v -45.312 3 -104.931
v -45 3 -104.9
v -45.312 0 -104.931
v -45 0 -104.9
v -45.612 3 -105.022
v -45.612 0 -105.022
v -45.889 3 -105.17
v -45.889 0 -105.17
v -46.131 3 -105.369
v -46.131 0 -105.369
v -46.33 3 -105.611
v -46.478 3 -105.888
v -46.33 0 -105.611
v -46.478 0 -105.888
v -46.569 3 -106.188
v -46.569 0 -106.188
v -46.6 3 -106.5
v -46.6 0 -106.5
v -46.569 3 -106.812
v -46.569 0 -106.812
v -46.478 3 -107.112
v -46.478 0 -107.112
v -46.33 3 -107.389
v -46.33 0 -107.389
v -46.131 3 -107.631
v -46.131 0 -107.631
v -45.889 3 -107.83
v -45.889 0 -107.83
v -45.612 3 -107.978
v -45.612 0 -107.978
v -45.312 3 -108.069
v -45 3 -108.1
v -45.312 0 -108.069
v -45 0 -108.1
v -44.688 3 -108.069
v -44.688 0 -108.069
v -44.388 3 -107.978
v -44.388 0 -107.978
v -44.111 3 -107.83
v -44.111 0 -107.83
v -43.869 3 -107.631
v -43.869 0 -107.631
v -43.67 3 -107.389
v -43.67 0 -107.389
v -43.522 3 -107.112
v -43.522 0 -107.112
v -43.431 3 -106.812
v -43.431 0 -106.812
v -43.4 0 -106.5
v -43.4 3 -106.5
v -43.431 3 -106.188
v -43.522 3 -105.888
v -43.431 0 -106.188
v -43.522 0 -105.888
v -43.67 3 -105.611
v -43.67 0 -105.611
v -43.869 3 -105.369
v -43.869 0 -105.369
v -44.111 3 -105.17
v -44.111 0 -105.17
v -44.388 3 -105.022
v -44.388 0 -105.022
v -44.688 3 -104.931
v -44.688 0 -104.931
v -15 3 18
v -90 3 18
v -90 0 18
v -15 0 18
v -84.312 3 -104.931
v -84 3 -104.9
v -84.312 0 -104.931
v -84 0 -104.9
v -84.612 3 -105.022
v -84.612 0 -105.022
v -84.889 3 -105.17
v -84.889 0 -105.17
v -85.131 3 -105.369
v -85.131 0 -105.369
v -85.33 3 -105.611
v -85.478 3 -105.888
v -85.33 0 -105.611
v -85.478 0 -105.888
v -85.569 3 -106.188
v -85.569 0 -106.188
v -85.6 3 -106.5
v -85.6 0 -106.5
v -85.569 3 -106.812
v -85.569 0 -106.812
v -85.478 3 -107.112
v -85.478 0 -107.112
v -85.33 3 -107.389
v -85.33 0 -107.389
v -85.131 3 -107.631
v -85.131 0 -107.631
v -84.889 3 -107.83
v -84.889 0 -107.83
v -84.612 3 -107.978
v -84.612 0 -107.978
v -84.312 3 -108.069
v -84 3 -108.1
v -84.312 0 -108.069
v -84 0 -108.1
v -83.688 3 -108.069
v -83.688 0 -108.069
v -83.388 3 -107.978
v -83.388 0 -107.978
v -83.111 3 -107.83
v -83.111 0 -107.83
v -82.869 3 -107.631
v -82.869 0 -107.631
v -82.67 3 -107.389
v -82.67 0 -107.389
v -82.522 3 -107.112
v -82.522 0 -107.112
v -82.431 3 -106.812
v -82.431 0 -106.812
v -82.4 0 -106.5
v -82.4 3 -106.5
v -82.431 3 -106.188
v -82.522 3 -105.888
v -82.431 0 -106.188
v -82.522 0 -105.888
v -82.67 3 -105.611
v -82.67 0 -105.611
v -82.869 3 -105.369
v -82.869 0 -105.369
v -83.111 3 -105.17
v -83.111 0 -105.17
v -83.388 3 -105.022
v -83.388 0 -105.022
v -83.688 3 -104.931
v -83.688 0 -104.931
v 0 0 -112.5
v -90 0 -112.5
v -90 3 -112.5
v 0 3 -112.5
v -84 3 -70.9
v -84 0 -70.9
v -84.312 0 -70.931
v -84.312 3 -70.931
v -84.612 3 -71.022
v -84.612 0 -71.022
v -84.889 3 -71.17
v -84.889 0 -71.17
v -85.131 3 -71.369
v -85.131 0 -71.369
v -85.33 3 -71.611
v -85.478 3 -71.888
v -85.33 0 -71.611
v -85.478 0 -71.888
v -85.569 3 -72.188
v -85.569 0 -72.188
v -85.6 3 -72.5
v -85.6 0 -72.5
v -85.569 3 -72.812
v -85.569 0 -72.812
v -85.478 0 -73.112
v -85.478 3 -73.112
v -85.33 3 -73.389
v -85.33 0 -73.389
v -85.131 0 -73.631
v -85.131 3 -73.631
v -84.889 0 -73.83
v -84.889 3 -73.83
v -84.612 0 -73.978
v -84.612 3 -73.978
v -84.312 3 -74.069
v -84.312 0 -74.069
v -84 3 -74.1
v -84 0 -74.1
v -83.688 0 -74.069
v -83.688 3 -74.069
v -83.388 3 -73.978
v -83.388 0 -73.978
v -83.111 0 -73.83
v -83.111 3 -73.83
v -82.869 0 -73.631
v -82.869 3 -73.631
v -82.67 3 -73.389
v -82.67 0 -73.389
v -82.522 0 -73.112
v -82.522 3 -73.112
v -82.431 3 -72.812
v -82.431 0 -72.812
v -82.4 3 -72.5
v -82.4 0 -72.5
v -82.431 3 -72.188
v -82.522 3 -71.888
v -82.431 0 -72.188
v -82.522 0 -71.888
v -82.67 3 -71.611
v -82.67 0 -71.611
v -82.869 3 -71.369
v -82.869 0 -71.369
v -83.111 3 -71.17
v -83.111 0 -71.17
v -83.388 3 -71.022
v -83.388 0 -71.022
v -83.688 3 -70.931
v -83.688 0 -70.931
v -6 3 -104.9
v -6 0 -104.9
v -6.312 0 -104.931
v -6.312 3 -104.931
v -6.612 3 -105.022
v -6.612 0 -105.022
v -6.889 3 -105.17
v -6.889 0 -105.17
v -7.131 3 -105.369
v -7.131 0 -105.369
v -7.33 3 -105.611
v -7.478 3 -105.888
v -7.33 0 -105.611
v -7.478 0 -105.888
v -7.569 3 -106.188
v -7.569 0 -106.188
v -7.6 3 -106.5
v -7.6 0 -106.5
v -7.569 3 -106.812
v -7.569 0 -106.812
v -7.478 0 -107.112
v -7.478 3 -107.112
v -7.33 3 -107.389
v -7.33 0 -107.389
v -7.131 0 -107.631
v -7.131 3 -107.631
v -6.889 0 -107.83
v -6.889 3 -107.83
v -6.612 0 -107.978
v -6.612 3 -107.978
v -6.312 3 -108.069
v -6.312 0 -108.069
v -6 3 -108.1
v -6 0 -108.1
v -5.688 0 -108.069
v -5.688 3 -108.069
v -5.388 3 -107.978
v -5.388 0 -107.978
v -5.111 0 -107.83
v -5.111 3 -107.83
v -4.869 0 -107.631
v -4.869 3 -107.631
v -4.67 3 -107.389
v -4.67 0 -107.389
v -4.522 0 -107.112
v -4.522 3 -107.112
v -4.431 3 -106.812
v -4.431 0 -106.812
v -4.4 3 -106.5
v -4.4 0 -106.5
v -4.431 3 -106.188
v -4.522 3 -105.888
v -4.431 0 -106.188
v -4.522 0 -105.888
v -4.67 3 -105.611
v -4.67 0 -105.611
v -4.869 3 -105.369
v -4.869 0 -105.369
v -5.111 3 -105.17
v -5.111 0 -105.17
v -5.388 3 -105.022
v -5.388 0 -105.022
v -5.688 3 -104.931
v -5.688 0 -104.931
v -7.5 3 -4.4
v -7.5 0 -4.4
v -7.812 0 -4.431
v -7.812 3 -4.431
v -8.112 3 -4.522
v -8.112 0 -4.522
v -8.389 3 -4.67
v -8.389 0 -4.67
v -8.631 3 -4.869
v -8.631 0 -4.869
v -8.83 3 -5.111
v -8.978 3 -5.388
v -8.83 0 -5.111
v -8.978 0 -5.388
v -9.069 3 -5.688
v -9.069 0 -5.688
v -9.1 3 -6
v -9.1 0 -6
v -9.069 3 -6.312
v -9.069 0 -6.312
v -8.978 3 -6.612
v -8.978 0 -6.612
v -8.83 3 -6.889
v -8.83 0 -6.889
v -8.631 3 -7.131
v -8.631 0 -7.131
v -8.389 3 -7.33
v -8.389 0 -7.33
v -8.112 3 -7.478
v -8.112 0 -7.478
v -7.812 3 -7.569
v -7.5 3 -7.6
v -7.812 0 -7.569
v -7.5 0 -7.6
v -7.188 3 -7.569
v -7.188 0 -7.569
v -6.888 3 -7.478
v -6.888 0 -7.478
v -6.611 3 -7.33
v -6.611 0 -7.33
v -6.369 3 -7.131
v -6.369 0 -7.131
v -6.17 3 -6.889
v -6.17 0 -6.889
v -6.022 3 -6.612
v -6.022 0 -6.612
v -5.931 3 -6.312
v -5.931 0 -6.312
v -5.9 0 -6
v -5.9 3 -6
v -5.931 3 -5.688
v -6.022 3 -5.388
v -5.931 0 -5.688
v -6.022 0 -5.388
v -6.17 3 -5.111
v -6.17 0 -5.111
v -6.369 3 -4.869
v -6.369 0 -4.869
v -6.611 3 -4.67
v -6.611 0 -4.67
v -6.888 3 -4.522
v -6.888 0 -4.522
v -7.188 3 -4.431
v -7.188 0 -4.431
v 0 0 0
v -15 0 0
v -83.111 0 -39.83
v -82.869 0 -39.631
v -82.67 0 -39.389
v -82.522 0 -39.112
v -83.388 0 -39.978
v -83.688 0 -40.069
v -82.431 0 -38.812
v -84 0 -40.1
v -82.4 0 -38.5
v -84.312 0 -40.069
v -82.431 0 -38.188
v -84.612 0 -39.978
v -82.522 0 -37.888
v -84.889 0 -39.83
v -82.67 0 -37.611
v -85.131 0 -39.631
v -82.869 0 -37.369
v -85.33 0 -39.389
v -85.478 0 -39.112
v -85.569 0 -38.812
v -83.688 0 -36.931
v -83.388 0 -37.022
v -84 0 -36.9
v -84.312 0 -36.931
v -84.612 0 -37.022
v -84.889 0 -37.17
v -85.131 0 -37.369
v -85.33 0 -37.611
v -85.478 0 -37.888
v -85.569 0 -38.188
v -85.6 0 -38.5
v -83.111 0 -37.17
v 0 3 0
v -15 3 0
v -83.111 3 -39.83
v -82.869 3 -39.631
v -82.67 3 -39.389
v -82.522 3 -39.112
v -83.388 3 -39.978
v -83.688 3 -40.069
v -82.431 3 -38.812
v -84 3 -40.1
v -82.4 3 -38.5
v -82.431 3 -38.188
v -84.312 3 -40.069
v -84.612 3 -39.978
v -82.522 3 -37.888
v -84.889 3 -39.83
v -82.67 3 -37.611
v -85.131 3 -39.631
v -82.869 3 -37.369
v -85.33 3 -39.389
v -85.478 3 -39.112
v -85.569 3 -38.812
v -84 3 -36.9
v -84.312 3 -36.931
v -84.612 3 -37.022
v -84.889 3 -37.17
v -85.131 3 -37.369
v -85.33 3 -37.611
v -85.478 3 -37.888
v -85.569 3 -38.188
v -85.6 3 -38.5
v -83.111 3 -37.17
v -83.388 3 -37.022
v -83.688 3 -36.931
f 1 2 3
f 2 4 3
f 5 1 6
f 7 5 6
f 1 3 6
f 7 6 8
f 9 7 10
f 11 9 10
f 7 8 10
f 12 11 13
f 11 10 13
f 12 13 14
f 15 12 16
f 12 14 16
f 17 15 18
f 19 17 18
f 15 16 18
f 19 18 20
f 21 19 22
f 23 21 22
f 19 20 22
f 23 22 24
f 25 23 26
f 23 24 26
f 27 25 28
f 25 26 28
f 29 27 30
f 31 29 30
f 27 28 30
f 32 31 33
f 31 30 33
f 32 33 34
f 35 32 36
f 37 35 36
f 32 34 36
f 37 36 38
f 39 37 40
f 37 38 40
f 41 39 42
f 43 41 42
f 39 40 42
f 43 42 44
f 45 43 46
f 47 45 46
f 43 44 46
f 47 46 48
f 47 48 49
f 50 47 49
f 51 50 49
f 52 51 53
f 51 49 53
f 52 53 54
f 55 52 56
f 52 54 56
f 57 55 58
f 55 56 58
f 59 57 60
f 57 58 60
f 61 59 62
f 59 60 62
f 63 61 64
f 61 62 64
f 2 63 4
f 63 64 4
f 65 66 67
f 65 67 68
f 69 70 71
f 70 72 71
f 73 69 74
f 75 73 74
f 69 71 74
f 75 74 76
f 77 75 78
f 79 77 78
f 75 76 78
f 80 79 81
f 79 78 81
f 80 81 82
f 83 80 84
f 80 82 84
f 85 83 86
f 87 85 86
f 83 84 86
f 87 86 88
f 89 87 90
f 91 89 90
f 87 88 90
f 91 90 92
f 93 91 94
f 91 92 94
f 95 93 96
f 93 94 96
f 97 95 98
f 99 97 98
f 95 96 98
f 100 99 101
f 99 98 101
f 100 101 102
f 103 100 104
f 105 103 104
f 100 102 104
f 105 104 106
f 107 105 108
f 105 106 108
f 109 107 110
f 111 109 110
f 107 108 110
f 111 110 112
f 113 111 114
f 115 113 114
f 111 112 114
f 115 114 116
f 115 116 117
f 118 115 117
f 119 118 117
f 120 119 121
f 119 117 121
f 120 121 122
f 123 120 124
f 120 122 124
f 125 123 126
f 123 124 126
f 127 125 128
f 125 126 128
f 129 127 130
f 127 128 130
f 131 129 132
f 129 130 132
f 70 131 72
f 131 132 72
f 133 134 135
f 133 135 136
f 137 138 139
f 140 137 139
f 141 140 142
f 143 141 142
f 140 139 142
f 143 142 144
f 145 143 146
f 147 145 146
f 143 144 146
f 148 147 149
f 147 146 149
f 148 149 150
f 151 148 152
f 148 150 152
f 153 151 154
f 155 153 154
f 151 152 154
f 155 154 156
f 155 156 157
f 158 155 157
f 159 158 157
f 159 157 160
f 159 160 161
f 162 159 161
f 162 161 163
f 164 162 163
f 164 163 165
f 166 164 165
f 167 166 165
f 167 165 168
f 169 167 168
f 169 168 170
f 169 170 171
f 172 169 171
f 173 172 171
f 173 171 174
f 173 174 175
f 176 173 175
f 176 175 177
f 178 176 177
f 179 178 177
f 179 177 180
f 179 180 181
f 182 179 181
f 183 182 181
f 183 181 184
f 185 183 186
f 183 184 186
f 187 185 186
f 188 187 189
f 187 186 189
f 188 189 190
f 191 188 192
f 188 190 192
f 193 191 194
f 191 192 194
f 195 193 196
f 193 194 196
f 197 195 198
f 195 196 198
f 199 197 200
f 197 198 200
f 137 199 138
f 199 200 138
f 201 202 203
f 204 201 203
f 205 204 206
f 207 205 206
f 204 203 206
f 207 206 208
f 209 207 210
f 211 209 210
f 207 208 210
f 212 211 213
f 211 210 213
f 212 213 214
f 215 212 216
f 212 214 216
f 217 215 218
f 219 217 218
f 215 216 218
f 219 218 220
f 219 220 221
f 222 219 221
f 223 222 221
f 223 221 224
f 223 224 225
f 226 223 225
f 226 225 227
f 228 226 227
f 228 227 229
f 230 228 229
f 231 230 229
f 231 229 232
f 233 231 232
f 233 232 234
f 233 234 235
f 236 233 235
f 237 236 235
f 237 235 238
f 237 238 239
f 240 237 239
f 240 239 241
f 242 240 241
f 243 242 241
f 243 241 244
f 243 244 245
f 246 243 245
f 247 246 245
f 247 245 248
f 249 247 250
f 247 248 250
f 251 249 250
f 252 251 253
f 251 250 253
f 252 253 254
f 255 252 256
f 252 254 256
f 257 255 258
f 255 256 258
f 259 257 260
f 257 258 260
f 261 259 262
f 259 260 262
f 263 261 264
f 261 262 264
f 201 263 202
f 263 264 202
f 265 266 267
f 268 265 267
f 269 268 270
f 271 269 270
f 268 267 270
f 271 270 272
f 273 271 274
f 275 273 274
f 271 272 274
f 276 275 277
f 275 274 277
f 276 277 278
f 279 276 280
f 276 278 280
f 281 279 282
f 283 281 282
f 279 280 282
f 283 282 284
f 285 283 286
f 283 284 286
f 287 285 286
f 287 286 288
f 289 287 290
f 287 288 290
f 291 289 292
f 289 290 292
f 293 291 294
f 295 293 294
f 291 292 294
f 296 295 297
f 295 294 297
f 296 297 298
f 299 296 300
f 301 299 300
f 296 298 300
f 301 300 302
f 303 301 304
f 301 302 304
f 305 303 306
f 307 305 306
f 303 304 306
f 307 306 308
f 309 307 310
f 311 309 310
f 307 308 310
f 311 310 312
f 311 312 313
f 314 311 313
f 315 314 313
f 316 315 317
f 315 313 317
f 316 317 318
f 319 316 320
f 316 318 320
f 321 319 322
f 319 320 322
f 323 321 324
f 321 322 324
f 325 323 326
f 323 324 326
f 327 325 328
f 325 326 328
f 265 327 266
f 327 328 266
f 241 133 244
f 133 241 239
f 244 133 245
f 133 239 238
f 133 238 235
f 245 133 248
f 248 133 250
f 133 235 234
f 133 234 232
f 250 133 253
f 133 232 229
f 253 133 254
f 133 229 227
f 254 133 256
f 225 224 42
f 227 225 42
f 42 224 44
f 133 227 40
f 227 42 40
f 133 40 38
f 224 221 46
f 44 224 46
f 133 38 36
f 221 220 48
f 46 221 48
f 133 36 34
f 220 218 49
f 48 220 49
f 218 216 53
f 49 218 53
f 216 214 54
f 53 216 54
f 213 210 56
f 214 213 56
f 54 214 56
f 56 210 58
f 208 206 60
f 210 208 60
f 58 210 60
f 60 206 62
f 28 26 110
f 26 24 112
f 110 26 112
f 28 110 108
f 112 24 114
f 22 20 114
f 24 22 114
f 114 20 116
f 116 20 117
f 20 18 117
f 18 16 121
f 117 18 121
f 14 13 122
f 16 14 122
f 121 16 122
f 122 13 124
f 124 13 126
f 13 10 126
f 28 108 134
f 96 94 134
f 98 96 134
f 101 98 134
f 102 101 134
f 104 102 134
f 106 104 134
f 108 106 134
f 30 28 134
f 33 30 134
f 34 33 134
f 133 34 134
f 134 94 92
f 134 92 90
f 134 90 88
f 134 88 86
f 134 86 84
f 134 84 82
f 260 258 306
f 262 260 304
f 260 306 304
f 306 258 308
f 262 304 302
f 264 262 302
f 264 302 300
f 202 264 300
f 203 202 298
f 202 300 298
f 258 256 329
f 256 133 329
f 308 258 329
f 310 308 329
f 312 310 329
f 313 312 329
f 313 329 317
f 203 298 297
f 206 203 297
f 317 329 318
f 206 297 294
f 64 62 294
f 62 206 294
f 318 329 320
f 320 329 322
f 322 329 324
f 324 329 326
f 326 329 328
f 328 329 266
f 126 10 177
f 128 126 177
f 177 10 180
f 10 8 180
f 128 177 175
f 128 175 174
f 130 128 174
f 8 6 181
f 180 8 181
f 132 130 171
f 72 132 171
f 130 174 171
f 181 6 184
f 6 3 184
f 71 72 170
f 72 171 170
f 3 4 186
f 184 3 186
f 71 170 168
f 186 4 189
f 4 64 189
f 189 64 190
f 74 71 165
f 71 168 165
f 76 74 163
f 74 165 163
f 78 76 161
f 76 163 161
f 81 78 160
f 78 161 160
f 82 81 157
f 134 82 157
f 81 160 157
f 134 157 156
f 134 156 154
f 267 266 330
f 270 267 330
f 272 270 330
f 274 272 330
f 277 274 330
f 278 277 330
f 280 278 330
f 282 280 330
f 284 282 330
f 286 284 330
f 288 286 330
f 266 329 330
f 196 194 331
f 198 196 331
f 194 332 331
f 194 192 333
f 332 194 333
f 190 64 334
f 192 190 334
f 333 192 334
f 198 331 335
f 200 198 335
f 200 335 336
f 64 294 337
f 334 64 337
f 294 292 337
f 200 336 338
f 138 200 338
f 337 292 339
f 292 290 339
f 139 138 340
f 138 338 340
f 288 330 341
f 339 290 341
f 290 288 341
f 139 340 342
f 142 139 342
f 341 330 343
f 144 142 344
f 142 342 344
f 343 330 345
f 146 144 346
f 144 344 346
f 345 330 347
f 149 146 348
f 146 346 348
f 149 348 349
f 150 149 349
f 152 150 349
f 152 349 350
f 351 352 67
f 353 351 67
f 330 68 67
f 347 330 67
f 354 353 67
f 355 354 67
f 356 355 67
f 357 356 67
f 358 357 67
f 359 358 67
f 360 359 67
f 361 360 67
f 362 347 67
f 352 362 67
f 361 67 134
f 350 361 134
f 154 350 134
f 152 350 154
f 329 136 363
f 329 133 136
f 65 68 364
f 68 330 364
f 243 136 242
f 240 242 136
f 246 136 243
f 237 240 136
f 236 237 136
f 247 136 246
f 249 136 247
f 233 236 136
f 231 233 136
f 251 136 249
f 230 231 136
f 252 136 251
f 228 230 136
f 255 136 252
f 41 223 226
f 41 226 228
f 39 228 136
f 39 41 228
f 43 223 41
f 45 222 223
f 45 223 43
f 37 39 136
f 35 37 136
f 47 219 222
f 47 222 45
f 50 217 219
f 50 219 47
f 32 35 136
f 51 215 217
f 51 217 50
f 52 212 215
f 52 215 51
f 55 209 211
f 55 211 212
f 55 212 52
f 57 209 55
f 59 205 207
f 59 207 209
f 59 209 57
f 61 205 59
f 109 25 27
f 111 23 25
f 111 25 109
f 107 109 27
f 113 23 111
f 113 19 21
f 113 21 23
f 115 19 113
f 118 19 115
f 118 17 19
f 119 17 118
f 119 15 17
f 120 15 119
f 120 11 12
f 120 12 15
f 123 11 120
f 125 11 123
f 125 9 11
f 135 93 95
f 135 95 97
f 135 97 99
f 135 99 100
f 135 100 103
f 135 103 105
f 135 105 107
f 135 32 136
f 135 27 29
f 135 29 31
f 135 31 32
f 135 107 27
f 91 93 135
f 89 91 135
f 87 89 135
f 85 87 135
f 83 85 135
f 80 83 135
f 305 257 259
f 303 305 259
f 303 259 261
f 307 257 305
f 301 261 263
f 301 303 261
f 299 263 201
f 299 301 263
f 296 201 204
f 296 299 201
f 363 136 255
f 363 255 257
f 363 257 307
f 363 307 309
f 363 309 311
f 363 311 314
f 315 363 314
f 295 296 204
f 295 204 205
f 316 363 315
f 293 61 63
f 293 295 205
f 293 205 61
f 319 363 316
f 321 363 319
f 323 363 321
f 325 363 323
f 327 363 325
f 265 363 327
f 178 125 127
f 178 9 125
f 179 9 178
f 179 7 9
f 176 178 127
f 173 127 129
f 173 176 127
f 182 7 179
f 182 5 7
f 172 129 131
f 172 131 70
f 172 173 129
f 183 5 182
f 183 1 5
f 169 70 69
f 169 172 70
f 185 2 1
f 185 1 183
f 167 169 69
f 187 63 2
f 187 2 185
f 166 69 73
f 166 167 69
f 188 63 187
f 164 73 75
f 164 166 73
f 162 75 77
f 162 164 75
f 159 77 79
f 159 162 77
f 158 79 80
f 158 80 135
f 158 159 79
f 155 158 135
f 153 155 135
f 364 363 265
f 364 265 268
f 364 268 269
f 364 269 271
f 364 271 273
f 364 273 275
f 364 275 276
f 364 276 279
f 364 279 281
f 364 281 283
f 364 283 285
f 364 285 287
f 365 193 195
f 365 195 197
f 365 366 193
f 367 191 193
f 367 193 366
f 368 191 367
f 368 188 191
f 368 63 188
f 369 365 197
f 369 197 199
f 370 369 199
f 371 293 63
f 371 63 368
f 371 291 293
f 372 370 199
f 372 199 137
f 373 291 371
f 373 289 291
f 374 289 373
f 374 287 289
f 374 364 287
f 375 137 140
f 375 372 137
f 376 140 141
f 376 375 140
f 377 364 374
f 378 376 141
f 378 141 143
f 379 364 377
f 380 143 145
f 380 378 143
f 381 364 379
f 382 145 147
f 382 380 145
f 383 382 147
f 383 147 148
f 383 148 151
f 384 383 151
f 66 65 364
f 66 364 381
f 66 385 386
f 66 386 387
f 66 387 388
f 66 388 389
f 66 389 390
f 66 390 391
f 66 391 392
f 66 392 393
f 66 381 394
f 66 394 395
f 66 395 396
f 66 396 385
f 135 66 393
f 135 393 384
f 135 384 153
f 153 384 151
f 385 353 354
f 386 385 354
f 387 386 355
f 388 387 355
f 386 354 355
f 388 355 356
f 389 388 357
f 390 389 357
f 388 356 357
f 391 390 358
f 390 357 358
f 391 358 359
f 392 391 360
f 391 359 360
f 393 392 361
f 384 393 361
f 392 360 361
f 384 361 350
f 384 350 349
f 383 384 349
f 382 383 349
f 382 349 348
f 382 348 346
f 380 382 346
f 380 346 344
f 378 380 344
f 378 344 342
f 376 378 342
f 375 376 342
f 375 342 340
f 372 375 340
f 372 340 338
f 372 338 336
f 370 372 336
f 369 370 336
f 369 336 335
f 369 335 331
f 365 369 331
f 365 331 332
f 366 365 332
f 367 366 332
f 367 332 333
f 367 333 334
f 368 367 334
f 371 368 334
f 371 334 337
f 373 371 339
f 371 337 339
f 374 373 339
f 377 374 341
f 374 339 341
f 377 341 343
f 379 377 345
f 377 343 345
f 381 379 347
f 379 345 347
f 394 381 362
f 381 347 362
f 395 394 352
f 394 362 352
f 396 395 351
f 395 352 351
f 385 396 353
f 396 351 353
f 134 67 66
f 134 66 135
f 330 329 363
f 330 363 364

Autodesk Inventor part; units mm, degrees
ref_plane "YZ Plane" through (0, 0, 0) normal (1, 0, 0) x (0, 1, 0)
ref_plane "XZ Plane" through (0, 0, 0) normal (0, 1, 0) x (-1, 0, 0)
ref_plane "XY Plane" through (0, 0, 0) normal (0, 0, 1) x (1, 0, 0)
sketch "Sketch1" plane through (0, 0, 0) normal (0, 1, 0) x (-1, 0, 0)
  line L0 (0, 0) -> (90, 0)
  line L1 (90, 0) -> (90, -112.5)
  line L2 (90, -112.5) -> (0, -112.5)
  line L3 (0, -112.5) -> (0, 0)
  dimension "d0" = 90
  dimension "d1" = 112.5
extrude "Extrusion1" add sketch "Sketch1" along normal blind 3
sketch "Sketch3" plane through (-90, 0, 0) normal (0, 0, 1) x (1, 0, 0)
  line L0 (90, 0) -> (0, 0) projected
  line L1 (90, 3) -> (0, 3) projected
  line L2 (0, 0) -> (75, 0)
  line L3 (75, 0) -> (75, 3)
  line L4 (75, 3) -> (0, 3)
  line L5 (0, 3) -> (0, 0)
  line L6 (90, 0) -> (90, 3) projected
  point P0 (0, 3)
  dimension "d5" = 15
extrude "Extrusion2" add sketch "Sketch3" along normal blind 18 contours L0 L5 L1 L3
sketch "Sketch4" plane through (0, 3, 0) normal (0, 1, 0) x (1, 0, 0)
  line L0 (-6, 128.5084) -> (-6, -27.8518) construction
  line L1 (-118.0415, 106.5) -> (21.4799, 106.5) construction
  line L2 (-84, 125.301) -> (-84, -43.3542) construction
  line L3 (-90, 112.5) -> (-90, -18) projected
  line L4 (0, 112.5) -> (-90, 112.5) projected
  line L5 (0, 0) -> (0, 112.5) projected
  line L6 (-35.7185, 6) -> (24.9546, 6) construction
  line L7 (-15, 0) -> (0, 0) projected
  point P0 (-7.5, 6)
  point P1 (-6, 106.5)
  point P2 (-45, 106.5)
  point P3 (-84, 106.5)
  point P4 (-84, 72.5)
  point P5 (-84, 38.5)
  dimension "d8" = 6
  dimension "d9" = 6
  dimension "d10" = 6
  dimension "d11" = 6
  dimension "d12" = 7.5
  dimension "d13" = 39
  dimension "d14" = 34
  dimension "d15" = 34
hole "Hole1" at (-7.5, 3, -6) at (-6, 3, -106.5) at (-45, 3, -106.5) at (-84, 3, -106.5) at (-84, 3, -72.5) at (-84, 3, -38.5) direction (0, -1, 0) diameter 3.2 end through all
properties part number "Gas Side Top Cover"
